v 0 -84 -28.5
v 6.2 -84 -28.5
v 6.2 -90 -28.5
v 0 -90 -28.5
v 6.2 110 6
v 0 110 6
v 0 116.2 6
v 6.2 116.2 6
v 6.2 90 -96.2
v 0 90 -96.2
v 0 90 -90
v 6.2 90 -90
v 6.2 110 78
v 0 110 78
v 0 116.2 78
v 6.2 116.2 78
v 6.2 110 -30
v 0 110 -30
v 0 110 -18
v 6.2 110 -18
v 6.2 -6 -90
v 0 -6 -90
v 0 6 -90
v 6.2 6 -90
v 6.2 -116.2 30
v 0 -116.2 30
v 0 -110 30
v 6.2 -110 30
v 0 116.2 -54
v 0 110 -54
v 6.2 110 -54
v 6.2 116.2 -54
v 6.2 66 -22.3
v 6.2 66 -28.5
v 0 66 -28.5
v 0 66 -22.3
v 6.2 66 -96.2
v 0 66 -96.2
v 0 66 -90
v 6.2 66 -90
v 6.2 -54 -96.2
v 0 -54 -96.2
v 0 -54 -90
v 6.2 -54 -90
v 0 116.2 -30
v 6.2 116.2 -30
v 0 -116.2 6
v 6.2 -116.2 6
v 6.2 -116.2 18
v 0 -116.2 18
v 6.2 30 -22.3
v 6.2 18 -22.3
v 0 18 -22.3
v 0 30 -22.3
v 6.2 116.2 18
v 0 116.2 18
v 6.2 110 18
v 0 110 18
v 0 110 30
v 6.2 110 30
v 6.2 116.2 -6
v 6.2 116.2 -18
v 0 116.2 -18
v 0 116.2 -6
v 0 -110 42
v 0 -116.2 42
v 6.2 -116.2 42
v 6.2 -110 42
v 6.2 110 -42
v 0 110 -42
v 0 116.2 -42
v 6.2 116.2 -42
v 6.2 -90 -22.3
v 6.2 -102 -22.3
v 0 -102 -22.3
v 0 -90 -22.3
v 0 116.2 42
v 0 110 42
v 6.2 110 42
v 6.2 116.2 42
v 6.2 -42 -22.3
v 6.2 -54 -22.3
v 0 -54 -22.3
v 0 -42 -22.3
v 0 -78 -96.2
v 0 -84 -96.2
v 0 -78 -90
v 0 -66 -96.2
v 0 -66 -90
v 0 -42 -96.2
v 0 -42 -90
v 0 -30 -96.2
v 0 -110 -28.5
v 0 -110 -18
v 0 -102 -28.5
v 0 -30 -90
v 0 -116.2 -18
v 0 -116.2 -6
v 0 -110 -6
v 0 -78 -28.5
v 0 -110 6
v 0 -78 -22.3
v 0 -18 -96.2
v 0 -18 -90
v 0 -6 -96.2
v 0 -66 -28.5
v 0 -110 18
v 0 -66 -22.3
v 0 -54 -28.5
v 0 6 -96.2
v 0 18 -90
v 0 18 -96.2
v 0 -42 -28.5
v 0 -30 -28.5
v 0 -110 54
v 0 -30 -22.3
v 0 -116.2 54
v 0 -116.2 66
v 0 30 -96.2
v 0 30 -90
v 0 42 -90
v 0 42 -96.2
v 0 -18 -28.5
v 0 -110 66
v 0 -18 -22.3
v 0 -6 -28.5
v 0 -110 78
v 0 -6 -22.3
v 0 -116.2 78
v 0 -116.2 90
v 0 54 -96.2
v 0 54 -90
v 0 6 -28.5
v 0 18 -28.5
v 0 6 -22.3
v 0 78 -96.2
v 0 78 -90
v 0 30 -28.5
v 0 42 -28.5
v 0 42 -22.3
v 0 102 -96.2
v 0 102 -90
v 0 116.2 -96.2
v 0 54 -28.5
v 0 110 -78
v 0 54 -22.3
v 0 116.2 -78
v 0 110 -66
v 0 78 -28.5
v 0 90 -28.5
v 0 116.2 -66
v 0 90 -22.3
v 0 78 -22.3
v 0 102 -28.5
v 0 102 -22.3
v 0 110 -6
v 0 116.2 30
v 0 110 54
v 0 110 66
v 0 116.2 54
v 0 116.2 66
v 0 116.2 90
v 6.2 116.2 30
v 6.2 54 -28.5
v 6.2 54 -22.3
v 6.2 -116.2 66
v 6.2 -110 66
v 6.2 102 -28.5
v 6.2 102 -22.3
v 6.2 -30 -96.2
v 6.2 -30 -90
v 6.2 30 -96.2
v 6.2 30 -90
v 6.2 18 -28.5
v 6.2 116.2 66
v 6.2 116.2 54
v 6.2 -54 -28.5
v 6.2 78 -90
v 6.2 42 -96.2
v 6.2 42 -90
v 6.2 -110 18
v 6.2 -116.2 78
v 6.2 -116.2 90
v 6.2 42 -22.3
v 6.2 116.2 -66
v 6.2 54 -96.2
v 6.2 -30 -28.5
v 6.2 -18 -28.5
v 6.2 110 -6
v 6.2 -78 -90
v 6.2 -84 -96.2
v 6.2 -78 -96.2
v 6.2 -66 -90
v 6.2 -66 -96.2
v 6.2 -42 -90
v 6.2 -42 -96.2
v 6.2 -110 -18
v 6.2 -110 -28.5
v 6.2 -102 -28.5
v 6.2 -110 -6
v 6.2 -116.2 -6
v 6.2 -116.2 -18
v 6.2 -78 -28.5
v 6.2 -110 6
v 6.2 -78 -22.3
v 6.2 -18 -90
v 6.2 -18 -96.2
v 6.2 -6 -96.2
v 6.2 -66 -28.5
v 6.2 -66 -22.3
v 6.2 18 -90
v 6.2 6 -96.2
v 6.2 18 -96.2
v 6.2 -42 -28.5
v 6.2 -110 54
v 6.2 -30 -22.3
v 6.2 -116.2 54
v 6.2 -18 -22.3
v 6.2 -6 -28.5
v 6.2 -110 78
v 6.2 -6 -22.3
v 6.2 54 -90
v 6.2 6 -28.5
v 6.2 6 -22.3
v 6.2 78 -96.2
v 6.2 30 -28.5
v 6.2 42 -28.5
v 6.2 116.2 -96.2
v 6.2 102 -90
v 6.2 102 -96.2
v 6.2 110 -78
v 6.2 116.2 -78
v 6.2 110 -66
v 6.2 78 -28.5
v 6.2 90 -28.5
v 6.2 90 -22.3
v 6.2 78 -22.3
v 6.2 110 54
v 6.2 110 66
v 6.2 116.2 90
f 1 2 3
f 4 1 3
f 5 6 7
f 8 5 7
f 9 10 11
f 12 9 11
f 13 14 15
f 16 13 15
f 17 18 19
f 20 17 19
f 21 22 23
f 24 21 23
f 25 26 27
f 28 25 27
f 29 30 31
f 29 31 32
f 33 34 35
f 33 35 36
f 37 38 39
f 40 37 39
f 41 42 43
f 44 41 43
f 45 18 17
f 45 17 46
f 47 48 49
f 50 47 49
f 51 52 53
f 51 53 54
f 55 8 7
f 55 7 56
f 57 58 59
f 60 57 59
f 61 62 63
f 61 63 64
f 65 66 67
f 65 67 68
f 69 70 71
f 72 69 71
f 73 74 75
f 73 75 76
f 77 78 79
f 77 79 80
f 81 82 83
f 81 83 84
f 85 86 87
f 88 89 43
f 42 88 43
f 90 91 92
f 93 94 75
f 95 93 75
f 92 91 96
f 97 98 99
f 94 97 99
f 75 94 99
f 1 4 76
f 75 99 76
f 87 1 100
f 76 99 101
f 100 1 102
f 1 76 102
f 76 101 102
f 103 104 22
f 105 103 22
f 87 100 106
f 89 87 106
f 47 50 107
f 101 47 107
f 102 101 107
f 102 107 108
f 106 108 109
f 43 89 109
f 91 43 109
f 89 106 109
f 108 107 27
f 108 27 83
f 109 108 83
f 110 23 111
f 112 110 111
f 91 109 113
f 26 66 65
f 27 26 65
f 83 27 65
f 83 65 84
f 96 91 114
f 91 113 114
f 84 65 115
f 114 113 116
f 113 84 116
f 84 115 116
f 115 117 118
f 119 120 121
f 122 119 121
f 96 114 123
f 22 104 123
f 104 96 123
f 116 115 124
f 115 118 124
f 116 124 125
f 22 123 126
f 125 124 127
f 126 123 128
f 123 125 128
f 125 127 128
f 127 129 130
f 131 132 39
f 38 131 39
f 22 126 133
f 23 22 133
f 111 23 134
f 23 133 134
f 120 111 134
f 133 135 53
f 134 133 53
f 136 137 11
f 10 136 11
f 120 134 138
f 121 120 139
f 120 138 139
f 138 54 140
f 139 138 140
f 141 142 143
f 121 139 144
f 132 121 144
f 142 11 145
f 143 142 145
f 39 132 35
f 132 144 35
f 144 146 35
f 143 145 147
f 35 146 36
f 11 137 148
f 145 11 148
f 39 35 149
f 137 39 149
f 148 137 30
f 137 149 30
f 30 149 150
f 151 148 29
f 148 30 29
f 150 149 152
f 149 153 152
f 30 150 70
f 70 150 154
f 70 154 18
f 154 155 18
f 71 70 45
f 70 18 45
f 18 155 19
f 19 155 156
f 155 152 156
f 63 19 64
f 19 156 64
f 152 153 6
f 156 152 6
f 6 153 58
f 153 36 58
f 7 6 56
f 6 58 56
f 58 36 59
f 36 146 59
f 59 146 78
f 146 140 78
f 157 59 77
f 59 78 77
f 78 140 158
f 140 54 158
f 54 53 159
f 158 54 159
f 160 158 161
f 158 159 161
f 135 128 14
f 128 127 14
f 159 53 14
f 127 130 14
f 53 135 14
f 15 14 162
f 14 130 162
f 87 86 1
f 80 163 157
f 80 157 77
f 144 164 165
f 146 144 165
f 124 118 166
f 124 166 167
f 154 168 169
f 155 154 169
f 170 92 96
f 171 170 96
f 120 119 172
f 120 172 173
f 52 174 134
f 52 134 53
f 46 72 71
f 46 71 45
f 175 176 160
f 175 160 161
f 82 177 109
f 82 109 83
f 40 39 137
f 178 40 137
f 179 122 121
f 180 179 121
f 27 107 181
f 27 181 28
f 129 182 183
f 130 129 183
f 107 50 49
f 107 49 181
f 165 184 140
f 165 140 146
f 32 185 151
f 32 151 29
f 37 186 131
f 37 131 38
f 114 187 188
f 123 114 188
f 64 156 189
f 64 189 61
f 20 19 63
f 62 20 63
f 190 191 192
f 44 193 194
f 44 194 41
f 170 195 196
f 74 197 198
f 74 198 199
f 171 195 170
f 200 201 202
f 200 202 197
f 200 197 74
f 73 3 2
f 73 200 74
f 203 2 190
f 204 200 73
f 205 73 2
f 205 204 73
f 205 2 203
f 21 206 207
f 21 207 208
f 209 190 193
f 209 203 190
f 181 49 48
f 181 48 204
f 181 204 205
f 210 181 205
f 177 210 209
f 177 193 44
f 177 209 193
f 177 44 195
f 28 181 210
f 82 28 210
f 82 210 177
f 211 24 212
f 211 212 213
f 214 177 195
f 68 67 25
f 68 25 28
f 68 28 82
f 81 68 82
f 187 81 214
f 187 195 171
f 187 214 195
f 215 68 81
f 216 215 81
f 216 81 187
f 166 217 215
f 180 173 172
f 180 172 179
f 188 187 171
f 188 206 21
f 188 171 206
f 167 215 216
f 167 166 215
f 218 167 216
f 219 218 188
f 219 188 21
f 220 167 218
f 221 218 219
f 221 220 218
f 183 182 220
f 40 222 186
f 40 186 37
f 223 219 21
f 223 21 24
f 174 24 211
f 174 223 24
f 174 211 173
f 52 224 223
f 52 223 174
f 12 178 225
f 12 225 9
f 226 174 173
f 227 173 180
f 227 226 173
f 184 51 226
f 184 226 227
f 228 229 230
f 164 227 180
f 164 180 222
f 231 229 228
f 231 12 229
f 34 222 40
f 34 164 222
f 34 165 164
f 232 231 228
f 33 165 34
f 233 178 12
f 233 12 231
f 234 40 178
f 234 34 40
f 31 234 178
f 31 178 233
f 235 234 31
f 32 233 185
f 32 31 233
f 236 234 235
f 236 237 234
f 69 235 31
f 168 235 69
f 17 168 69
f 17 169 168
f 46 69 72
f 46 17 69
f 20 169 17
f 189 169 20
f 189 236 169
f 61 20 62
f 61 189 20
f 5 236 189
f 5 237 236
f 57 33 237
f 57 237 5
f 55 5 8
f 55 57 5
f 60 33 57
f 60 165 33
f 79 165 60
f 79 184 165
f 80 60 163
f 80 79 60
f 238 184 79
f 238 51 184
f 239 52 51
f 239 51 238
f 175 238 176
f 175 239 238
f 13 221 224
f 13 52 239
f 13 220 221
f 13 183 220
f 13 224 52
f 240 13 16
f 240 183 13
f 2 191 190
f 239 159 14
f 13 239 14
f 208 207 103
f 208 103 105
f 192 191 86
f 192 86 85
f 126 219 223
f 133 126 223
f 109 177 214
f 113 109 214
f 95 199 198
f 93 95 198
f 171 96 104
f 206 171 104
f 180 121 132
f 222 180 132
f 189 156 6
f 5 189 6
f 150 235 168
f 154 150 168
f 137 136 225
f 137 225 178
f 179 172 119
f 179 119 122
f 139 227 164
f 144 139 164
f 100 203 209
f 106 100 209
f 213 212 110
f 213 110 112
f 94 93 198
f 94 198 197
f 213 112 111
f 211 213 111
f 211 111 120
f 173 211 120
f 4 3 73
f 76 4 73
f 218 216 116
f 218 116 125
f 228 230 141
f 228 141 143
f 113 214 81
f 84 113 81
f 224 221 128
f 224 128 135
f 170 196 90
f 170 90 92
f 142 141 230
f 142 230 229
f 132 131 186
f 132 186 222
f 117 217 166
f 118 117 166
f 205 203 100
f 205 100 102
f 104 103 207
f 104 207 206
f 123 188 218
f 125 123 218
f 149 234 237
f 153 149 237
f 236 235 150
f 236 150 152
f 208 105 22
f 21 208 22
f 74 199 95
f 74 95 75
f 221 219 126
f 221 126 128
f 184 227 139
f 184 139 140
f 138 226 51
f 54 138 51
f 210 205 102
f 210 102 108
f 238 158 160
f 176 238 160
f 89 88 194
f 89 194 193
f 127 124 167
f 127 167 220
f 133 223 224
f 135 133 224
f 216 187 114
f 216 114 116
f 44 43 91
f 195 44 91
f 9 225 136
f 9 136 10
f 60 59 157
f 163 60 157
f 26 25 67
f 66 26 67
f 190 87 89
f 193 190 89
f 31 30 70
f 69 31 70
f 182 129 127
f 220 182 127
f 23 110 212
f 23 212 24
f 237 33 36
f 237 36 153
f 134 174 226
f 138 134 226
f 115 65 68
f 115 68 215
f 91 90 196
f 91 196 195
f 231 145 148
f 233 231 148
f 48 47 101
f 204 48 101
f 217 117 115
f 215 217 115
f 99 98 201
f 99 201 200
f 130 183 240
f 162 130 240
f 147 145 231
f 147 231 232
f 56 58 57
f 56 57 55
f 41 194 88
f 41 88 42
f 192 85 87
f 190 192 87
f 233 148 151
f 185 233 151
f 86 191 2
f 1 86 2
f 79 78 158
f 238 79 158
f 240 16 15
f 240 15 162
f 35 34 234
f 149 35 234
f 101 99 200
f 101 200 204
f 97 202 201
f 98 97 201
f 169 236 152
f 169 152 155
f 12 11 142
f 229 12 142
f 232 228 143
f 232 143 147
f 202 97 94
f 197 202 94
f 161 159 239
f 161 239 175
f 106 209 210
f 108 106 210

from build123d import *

# Parameters (mm, degrees)
F0_W      = 220
F0_H      = 180
F1_DEPTH  = 6.2
F2_W      = 12
F2_H      = 6.2
F3_DEPTH  = 6.201
F5_DEPTH  = 6.201
F6_W      = 6.2
F6_H      = 12
F7_DEPTH  = 6.2
F8_W      = 6
F8_H      = 6.2
F8_W_2    = 12
F9_DEPTH  = 6.2
F10_W     = 2.2
F10_H     = 6.2
F11_DEPTH = 6.2


with BuildPart() as f1:
    # F0 (on Right) → F1 (new body)
    with BuildSketch(Plane.YZ):
        Rectangle(F0_W, F0_H)
    extrude(amount=F1_DEPTH)

    # F2 (on face) → F3 (cut, through all)
    with BuildSketch(Plane.YZ.offset(6.2)):
        with Locations((-96, -25.4)):
            Rectangle(F2_W, F2_H)
        with Locations((-72, -25.4)):
            Rectangle(F2_W, F2_H)
        with Locations((-48, -25.4)):
            Rectangle(F2_W, F2_H)
        with Locations((-24, -25.4)):
            Rectangle(F2_W, F2_H)
        with Locations((0, -25.4)):
            Rectangle(F2_W, F2_H)
        with Locations((24, -25.4)):
            Rectangle(F2_W, F2_H)
        with Locations((48, -25.4)):
            Rectangle(F2_W, F2_H)
        with Locations((72, -25.4)):
            Rectangle(F2_W, F2_H)
        with Locations((96, -25.4)):
            Rectangle(F2_W, F2_H)
    extrude(amount=-F3_DEPTH, mode=Mode.SUBTRACT)

    # F4 (on face) → F5 (cut, through all)
    with BuildSketch(Plane.YZ.offset(6.2)):
        Polygon((-84, -90), (-84, -28.5), (-90, -28.5), (-102, -28.5), (-110, -28.5), (-110, -90), align=None)
    extrude(amount=-F5_DEPTH, mode=Mode.SUBTRACT)

    # F6 (on face) → F7 (join)
    with BuildSketch(Plane.YZ.offset(6.2)):
        with Locations((113.1, 12)):
            Rectangle(F6_W, F6_H)
        with Locations((113.1, 36)):
            Rectangle(F6_W, F6_H)
        with Locations((113.1, 60)):
            Rectangle(F6_W, F6_H)
        with Locations((113.1, 84)):
            Rectangle(F6_W, F6_H)
        with Locations((113.1, -12)):
            Rectangle(F6_W, F6_H)
        with Locations((113.1, -36)):
            Rectangle(F6_W, F6_H)
        with Locations((113.1, -60)):
            Rectangle(F6_W, F6_H)
        with Locations((113.1, -84)):
            Rectangle(F6_W, F6_H)
        with Locations((-113.1, 12)):
            Rectangle(F6_W, F6_H)
        with Locations((-113.1, -12)):
            Rectangle(F6_W, F6_H)
        with Locations((-113.1, 36)):
            Rectangle(F6_W, F6_H)
        with Locations((-113.1, 84)):
            Rectangle(F6_W, F6_H)
        with Locations((-113.1, 60)):
            Rectangle(F6_W, F6_H)
    extrude(amount=-F7_DEPTH)

    # F8 (on face) → F9 (join)
    with BuildSketch(Plane.YZ.offset(6.2)):
        with Locations((-81, -93.1)):
            Rectangle(F8_W, F8_H)
        with Locations((-60, -93.1)):
            Rectangle(F8_W_2, F8_H)
        with Locations((-36, -93.1)):
            Rectangle(F8_W_2, F8_H)
        with Locations((-12, -93.1)):
            Rectangle(F8_W_2, F8_H)
        with Locations((12, -93.1)):
            Rectangle(F8_W_2, F8_H)
        with Locations((36, -93.1)):
            Rectangle(F8_W_2, F8_H)
        with Locations((60, -93.1)):
            Rectangle(F8_W_2, F8_H)
        with Locations((84, -93.1)):
            Rectangle(F8_W_2, F8_H)
        with Locations((108, -93.1)):
            Rectangle(F8_W_2, F8_H)
    extrude(amount=-F9_DEPTH)

    # F10 (on face) → F11 (join)
    with BuildSketch(Plane.YZ.offset(6.2)):
        with Locations((115.1, -93.1)):
            Rectangle(F10_W, F10_H)
    extrude(amount=-F11_DEPTH)


solid = f1.part
